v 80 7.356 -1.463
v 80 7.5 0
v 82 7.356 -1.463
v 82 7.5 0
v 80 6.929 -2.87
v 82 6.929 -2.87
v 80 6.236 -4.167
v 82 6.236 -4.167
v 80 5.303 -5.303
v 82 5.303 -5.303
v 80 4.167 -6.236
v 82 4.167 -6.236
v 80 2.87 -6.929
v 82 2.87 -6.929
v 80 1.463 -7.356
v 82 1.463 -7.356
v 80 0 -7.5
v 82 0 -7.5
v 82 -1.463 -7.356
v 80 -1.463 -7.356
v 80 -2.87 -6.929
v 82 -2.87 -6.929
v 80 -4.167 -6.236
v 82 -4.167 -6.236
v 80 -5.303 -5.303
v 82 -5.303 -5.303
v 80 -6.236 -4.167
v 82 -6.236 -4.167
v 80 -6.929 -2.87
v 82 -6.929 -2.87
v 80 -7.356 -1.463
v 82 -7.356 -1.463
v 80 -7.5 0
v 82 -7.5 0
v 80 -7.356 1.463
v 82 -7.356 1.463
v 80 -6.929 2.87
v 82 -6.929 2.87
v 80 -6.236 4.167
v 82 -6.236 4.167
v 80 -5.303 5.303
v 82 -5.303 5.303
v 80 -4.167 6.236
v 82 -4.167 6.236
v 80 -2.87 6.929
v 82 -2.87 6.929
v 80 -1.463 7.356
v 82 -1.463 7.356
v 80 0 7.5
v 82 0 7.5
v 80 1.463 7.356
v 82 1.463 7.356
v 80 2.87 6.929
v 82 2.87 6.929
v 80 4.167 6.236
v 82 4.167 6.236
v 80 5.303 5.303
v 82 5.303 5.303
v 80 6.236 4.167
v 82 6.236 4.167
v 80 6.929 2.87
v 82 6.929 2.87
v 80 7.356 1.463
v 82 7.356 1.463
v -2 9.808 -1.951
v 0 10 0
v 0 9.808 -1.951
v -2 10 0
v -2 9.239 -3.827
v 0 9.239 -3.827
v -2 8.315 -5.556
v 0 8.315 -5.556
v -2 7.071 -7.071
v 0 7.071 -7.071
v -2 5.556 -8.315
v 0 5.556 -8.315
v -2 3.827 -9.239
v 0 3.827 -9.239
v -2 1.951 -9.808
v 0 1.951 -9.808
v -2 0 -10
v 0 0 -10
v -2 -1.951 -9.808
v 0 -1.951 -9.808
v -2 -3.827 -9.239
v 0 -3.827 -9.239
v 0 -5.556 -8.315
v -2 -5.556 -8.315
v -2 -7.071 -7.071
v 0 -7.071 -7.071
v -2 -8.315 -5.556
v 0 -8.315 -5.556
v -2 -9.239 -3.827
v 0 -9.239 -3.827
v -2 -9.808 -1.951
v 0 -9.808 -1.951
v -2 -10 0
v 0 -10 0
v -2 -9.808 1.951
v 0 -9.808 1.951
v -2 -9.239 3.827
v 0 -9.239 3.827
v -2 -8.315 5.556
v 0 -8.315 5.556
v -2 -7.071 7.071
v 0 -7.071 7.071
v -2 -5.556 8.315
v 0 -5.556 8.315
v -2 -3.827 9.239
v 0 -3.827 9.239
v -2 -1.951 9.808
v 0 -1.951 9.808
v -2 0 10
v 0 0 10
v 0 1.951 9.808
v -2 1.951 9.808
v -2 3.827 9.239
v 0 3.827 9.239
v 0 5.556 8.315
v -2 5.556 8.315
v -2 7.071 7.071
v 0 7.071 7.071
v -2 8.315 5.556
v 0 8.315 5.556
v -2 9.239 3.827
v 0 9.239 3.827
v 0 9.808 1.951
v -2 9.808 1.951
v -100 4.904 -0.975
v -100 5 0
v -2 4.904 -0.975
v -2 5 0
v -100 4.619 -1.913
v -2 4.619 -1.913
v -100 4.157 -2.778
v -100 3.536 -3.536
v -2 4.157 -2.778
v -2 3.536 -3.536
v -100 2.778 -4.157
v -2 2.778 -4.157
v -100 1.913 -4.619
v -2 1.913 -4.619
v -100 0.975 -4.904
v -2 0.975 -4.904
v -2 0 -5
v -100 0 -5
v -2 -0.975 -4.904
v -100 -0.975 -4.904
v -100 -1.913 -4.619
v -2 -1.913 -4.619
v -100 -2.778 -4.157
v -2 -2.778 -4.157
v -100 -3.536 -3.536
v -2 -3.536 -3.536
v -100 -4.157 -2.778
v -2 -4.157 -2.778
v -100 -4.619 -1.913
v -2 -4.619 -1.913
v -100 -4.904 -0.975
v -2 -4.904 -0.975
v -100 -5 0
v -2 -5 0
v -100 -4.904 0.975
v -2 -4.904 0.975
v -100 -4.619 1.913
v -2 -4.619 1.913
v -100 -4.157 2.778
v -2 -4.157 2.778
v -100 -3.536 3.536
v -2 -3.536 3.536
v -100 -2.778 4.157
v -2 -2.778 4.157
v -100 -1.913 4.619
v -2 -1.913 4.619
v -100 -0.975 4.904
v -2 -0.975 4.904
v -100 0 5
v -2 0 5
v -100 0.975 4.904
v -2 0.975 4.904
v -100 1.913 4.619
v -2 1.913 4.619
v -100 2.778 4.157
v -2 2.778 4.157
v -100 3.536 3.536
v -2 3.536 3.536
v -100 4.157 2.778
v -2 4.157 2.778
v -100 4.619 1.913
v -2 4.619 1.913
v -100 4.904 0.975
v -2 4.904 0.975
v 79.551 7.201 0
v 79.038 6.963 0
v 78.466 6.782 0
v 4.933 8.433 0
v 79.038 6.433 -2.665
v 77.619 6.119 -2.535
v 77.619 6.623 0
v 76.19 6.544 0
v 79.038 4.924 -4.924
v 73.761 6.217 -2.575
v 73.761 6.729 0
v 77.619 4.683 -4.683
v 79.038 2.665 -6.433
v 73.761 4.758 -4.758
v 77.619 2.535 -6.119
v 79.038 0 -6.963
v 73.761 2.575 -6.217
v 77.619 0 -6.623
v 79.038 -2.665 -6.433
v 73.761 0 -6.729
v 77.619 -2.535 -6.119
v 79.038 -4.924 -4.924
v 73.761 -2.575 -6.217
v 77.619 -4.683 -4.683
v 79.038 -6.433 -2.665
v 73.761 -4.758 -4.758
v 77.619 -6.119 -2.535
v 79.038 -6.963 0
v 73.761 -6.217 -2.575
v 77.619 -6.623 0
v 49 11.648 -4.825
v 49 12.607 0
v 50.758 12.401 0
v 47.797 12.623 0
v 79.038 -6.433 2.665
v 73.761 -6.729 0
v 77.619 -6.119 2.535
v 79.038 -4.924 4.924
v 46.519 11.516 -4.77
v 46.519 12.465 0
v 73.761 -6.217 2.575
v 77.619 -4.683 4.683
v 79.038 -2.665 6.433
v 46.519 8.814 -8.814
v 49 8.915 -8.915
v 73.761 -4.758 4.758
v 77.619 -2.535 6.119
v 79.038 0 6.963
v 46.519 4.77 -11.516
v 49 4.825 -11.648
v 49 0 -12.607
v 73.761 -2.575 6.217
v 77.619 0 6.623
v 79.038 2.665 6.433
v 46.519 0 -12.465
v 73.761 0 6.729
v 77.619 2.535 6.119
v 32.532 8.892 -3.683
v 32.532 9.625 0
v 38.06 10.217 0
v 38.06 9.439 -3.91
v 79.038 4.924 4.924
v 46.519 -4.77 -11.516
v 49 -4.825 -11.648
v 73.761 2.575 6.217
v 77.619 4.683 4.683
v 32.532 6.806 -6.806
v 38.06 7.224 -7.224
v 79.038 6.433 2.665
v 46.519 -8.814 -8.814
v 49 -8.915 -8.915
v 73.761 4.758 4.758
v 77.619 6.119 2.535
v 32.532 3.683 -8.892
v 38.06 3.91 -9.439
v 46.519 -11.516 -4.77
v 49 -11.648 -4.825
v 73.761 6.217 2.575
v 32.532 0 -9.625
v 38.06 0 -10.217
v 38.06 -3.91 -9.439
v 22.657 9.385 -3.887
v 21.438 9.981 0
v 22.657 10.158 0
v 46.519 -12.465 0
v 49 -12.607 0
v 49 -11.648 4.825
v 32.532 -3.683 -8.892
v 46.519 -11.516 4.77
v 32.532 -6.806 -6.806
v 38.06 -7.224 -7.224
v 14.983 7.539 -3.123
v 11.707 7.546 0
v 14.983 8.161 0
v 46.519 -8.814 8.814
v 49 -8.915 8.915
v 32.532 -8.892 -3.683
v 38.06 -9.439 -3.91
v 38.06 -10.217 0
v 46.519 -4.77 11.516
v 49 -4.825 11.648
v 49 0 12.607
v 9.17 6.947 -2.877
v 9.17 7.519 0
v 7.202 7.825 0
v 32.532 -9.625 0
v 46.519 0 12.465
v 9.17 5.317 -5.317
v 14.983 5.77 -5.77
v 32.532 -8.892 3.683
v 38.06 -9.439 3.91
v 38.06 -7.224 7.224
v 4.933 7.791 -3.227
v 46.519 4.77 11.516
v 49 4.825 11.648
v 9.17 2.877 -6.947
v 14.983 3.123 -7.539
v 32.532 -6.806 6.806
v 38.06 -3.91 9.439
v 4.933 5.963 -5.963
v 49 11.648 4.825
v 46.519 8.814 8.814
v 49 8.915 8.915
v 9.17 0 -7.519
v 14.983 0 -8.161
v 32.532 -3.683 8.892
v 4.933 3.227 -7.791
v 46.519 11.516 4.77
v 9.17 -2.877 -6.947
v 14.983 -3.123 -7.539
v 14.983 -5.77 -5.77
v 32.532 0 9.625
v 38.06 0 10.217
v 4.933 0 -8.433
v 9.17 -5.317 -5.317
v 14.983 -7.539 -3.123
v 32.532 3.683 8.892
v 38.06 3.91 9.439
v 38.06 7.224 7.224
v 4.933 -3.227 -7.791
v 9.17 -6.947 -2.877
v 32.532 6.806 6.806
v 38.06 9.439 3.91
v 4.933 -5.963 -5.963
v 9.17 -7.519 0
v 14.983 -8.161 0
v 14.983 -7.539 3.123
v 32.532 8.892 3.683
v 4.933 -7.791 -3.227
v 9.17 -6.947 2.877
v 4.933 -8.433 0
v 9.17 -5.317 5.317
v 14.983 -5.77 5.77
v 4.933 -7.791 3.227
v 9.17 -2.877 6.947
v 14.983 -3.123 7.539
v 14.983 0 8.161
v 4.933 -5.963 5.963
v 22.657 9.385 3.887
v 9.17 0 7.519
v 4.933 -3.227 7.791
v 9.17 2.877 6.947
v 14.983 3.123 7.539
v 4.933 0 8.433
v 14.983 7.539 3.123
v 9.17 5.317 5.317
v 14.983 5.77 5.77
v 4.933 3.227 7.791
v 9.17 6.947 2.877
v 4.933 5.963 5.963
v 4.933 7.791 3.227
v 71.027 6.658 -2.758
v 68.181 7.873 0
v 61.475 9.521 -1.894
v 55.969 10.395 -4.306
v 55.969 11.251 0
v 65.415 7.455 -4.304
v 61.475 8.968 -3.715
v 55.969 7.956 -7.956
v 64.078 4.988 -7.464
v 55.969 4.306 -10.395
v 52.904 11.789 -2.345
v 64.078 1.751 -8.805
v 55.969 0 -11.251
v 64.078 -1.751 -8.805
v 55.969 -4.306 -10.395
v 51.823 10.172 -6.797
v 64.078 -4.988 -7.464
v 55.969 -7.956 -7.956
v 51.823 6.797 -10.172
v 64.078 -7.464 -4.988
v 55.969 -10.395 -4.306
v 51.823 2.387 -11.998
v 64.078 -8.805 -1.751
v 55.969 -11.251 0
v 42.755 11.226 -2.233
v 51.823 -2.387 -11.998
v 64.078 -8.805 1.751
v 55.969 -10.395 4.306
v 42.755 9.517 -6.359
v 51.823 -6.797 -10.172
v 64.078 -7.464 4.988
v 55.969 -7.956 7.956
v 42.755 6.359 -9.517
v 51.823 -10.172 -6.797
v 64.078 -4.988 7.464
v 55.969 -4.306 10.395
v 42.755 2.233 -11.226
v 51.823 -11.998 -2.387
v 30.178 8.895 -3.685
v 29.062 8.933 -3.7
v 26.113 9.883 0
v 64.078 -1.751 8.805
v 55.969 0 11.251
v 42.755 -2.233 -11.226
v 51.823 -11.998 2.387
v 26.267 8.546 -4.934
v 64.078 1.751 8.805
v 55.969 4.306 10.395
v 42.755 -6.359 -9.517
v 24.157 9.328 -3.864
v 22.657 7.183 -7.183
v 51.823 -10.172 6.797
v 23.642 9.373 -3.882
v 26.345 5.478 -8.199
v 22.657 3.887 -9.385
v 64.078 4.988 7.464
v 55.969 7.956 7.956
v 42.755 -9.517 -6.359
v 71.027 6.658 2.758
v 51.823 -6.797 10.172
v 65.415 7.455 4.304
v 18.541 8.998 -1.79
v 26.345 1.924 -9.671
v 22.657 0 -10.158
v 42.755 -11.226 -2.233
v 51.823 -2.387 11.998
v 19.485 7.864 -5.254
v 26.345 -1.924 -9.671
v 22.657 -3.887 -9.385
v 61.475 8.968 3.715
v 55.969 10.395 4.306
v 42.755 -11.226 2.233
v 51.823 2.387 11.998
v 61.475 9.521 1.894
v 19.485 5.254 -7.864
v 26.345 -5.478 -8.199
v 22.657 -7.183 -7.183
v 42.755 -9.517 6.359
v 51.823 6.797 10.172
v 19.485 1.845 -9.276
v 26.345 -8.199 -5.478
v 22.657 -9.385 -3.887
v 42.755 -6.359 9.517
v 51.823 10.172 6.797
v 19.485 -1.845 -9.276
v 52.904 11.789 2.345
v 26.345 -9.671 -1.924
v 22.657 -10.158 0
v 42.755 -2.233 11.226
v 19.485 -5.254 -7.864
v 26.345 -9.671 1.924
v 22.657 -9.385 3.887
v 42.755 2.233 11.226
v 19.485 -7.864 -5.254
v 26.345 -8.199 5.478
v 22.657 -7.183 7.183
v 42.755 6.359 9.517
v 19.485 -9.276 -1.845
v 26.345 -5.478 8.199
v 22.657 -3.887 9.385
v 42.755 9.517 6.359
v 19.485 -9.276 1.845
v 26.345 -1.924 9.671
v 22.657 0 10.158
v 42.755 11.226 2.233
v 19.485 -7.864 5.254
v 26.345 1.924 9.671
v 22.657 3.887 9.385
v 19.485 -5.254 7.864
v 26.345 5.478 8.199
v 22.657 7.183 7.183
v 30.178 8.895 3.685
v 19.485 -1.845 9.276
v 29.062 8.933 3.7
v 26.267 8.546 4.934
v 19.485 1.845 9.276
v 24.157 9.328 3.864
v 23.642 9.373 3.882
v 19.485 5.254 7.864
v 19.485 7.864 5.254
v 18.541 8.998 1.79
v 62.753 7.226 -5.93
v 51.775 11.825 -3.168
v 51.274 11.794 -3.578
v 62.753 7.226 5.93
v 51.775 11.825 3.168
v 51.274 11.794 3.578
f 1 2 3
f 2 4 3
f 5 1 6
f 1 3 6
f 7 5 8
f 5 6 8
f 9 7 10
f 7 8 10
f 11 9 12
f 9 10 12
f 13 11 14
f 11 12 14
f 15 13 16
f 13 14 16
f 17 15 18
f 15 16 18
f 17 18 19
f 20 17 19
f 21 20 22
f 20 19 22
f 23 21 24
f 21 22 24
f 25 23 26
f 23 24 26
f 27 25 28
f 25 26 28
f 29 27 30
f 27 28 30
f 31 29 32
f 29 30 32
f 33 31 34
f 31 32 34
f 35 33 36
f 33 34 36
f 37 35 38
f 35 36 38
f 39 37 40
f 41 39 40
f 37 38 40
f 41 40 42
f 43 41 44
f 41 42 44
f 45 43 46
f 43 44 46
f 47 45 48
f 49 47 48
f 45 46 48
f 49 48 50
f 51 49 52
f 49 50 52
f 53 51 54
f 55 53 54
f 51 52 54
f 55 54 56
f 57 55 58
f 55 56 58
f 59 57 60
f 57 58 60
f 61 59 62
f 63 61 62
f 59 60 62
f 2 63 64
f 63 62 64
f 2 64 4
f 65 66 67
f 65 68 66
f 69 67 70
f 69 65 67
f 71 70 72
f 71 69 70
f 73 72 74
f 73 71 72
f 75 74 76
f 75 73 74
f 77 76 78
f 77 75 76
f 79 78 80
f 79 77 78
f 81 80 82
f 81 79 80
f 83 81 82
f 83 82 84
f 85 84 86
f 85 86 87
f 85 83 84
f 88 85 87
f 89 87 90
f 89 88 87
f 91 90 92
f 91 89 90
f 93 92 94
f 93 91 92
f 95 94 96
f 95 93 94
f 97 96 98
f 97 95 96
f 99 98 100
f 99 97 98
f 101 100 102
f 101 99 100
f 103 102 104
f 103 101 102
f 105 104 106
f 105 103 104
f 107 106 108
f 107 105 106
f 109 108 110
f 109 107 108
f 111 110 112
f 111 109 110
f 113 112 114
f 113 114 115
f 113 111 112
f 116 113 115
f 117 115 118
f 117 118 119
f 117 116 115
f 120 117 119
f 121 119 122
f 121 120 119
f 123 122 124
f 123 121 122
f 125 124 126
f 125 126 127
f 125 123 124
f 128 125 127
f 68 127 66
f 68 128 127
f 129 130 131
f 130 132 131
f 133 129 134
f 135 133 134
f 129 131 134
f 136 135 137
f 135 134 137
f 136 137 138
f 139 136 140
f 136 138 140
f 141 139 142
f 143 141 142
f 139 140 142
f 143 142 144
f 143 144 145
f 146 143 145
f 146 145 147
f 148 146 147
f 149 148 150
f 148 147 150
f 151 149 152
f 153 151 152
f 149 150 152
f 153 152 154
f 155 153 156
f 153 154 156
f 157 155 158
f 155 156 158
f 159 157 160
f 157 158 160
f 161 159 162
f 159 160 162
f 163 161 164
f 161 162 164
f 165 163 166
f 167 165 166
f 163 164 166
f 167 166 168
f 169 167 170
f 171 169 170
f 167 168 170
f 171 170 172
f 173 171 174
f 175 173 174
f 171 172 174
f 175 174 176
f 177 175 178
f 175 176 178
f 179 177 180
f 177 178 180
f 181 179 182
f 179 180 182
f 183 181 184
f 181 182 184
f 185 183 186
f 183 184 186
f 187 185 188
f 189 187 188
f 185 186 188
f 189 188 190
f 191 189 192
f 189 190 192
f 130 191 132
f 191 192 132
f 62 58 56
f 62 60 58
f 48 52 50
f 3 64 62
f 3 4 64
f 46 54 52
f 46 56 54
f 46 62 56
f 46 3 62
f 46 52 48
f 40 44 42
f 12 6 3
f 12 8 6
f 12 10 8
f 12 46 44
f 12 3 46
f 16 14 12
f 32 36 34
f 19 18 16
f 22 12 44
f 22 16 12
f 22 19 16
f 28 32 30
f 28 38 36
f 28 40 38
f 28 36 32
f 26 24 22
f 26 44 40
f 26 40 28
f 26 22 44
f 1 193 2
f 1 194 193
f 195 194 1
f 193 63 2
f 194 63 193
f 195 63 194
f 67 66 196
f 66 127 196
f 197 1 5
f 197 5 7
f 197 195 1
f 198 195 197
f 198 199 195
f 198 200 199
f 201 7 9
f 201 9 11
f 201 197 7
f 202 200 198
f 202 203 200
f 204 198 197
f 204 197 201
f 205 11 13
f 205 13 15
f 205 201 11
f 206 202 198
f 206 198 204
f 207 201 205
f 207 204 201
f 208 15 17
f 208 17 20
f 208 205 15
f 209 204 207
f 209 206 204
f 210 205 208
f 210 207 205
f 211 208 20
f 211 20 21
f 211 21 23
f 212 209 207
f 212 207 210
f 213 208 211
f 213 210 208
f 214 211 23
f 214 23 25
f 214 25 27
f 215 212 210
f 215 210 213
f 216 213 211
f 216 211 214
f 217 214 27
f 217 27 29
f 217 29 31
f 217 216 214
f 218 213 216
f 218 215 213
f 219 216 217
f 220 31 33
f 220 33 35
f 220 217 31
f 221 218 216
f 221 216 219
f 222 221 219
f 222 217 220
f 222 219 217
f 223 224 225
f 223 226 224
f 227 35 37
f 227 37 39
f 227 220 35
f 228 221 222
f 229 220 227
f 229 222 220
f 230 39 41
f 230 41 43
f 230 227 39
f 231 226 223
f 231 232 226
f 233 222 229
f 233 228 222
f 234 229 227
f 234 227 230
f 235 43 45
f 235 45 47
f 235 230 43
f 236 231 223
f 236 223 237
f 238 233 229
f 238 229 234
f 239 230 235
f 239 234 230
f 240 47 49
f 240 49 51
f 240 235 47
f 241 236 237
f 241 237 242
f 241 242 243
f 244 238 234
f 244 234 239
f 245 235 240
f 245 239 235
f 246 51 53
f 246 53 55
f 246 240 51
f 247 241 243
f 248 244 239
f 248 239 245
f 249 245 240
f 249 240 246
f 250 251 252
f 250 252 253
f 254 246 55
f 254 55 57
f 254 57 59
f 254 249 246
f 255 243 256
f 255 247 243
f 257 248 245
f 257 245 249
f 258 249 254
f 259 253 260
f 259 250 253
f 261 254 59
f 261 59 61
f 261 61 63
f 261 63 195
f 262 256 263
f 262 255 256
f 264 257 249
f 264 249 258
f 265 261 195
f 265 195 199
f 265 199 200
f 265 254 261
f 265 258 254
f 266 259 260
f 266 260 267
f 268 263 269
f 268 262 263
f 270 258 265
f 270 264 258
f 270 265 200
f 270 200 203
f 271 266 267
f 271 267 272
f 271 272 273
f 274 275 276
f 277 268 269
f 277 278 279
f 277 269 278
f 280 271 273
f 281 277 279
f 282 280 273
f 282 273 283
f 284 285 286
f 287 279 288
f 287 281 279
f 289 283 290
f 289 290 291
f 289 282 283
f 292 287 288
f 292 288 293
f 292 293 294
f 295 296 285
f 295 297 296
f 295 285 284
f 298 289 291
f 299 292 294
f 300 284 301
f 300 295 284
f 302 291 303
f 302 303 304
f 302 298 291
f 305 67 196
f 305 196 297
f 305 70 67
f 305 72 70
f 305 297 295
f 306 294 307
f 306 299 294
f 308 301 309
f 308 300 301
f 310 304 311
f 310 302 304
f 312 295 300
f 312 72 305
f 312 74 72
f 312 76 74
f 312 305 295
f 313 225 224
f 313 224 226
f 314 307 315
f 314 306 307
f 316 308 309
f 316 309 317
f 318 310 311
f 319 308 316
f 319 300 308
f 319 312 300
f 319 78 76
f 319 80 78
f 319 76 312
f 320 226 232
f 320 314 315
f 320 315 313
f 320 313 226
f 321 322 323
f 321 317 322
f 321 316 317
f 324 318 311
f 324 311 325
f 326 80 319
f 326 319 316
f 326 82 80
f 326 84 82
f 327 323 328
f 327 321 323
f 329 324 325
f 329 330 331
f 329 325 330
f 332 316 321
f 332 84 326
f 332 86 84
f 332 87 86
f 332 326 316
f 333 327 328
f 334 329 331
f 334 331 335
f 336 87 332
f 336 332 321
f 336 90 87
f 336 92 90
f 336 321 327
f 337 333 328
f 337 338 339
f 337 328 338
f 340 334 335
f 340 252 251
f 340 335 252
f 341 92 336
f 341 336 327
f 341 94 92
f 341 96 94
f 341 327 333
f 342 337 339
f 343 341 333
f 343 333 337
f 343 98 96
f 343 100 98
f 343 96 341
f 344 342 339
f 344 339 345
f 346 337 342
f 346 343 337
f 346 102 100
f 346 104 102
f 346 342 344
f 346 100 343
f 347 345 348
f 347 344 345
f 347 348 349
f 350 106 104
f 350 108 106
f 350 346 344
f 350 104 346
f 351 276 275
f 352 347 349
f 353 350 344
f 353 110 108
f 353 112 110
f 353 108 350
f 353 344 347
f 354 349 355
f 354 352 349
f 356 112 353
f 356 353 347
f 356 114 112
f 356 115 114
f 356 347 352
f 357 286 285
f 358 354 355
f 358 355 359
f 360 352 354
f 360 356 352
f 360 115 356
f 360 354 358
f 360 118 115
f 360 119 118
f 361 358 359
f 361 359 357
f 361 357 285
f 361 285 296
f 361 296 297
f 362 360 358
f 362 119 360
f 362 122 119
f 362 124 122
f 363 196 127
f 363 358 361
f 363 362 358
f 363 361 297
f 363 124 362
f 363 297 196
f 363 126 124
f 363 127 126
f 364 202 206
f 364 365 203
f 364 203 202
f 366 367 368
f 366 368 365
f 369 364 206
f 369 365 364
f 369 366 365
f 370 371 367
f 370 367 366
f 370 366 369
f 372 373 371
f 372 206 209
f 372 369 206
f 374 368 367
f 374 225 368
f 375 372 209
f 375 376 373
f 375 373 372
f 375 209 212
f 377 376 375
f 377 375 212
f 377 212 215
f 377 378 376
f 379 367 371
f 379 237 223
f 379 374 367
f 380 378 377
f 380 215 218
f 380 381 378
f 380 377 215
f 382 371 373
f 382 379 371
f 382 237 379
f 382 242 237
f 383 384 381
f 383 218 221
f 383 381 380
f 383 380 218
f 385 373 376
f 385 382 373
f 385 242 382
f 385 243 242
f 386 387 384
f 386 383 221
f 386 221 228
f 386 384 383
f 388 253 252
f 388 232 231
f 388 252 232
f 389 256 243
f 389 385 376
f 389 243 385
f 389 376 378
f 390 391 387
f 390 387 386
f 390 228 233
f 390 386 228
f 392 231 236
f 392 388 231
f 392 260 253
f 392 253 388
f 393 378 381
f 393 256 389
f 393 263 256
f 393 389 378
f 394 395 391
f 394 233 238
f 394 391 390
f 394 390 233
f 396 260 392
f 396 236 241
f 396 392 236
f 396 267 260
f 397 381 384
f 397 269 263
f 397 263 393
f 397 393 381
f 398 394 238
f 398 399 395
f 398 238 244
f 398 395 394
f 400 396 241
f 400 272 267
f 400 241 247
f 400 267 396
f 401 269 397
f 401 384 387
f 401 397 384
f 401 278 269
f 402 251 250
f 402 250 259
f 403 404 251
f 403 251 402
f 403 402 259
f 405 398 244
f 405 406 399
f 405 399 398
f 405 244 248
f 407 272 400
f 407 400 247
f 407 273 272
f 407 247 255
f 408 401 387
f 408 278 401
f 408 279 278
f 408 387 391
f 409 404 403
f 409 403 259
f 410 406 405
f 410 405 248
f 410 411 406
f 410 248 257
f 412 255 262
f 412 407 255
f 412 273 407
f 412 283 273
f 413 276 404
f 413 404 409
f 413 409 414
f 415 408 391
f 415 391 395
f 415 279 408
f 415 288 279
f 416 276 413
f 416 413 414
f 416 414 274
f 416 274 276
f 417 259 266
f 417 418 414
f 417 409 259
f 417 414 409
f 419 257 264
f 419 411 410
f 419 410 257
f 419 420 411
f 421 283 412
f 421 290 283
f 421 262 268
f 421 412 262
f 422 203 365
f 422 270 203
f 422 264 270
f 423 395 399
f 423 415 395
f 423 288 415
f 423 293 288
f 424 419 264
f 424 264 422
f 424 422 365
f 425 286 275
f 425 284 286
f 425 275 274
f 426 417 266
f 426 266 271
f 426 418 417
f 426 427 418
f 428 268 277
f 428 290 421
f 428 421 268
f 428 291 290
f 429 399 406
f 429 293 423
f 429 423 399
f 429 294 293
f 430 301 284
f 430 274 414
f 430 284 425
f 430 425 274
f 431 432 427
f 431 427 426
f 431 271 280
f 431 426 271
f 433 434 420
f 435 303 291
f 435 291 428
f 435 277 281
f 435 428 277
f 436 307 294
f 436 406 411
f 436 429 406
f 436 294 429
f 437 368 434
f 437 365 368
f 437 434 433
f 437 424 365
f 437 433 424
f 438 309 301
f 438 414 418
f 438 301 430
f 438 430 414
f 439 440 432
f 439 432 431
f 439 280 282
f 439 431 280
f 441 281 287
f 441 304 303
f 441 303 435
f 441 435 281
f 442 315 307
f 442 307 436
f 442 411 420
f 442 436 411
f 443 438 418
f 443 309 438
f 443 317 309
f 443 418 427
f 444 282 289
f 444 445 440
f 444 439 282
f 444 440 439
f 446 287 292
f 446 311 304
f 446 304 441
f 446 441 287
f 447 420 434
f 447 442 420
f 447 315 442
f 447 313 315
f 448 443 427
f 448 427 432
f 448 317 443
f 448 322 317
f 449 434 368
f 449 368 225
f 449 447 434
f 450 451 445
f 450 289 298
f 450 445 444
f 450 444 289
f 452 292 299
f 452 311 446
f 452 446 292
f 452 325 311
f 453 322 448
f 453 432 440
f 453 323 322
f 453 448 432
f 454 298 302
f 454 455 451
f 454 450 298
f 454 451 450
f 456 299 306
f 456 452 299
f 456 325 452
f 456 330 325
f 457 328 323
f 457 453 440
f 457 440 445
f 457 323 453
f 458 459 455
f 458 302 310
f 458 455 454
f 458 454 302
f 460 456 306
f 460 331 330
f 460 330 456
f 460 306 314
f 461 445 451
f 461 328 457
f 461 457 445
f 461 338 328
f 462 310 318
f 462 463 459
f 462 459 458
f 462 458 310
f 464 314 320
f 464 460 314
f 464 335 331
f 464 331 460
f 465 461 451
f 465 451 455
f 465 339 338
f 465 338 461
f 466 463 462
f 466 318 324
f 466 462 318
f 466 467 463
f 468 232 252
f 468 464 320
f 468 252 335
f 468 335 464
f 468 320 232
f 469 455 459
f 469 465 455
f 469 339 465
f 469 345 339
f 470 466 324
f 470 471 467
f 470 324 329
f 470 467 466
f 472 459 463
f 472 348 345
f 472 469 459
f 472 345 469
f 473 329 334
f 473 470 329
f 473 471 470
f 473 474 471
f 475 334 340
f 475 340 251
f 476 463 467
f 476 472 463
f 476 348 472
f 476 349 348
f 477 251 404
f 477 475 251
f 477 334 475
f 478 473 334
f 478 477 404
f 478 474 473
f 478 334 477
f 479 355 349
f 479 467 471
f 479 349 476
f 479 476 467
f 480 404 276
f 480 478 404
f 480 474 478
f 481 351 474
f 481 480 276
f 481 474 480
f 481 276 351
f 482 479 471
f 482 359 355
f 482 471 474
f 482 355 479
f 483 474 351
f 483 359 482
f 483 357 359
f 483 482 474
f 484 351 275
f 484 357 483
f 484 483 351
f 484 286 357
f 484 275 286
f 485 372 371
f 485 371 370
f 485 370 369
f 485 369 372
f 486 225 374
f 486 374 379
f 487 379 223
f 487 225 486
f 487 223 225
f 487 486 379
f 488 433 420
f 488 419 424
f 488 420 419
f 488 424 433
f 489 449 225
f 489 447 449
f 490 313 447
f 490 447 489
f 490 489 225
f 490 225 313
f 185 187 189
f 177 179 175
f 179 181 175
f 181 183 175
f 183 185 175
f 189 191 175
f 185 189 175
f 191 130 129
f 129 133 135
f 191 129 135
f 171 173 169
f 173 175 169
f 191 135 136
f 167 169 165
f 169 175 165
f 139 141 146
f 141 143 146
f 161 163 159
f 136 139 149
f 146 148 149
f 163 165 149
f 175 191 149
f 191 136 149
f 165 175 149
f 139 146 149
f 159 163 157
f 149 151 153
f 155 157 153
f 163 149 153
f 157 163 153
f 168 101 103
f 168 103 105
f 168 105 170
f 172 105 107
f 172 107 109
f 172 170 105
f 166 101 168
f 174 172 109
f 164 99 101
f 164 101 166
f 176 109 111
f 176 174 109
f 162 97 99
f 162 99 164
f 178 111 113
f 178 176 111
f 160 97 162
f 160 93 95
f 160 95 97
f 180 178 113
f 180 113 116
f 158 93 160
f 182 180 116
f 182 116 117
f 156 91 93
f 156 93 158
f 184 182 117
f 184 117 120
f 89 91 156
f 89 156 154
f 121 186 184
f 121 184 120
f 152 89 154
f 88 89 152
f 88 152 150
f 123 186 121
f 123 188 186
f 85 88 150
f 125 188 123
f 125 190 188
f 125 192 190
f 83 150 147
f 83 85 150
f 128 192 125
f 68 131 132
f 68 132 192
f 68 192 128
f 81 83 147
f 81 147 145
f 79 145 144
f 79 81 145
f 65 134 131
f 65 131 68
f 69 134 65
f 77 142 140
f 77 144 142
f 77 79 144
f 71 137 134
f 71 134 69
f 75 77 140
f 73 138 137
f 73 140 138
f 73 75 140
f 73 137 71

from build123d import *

# Parameters (mm, degrees)
F0_W   = 98
F0_H   = 5
F0_W_2 = 2
F0_H_2 = 7.5


with BuildPart() as f1:
    # F0 (on Top) → F1 (revolve)
    with BuildSketch(Plane.XY):
        with BuildLine():
            Line((0, 10), (0, 0))
            Line((0, 0), (80, 0))
            Line((80, 0), (80, 7.5))
            add(Edge.make_bspline(
                [(80, 7.5), (77.4320963341, 5.4602127374), (64.9277701604, 8.6077862709), (53.6662401112, 12.0157463446), (50.0245369175, 12.5048198747), (46.3291163152, 12.9393686412), (36.7743339747, 8.9436592945), (24.9276027824, 9.9274888653), (21.6319746465, 10.5063086165), (10.220435011, 5.9188095094), (4.6241535969, 8.6259927698), (0, 10)],
                knots=[0, 0, 0, 0, 0.1463849193, 0.2822756936, 0.3513645208, 0.4207173296, 0.544584059, 0.6744916377, 0.7457775925, 0.8705254251, 1, 1, 1, 1], degree=3))
        make_face()
        Polygon((-2, 0), (0, 0), (0, 10), (-2, 10), (-2, 5), align=None)
        with Locations((-51, 2.5)):
            Rectangle(F0_W, F0_H)
        with Locations((81, 3.75)):
            Rectangle(F0_W_2, F0_H_2)
    revolve(axis=Axis((-50, 0, 0), (-1, 0, 0)))


solid = f1.part
